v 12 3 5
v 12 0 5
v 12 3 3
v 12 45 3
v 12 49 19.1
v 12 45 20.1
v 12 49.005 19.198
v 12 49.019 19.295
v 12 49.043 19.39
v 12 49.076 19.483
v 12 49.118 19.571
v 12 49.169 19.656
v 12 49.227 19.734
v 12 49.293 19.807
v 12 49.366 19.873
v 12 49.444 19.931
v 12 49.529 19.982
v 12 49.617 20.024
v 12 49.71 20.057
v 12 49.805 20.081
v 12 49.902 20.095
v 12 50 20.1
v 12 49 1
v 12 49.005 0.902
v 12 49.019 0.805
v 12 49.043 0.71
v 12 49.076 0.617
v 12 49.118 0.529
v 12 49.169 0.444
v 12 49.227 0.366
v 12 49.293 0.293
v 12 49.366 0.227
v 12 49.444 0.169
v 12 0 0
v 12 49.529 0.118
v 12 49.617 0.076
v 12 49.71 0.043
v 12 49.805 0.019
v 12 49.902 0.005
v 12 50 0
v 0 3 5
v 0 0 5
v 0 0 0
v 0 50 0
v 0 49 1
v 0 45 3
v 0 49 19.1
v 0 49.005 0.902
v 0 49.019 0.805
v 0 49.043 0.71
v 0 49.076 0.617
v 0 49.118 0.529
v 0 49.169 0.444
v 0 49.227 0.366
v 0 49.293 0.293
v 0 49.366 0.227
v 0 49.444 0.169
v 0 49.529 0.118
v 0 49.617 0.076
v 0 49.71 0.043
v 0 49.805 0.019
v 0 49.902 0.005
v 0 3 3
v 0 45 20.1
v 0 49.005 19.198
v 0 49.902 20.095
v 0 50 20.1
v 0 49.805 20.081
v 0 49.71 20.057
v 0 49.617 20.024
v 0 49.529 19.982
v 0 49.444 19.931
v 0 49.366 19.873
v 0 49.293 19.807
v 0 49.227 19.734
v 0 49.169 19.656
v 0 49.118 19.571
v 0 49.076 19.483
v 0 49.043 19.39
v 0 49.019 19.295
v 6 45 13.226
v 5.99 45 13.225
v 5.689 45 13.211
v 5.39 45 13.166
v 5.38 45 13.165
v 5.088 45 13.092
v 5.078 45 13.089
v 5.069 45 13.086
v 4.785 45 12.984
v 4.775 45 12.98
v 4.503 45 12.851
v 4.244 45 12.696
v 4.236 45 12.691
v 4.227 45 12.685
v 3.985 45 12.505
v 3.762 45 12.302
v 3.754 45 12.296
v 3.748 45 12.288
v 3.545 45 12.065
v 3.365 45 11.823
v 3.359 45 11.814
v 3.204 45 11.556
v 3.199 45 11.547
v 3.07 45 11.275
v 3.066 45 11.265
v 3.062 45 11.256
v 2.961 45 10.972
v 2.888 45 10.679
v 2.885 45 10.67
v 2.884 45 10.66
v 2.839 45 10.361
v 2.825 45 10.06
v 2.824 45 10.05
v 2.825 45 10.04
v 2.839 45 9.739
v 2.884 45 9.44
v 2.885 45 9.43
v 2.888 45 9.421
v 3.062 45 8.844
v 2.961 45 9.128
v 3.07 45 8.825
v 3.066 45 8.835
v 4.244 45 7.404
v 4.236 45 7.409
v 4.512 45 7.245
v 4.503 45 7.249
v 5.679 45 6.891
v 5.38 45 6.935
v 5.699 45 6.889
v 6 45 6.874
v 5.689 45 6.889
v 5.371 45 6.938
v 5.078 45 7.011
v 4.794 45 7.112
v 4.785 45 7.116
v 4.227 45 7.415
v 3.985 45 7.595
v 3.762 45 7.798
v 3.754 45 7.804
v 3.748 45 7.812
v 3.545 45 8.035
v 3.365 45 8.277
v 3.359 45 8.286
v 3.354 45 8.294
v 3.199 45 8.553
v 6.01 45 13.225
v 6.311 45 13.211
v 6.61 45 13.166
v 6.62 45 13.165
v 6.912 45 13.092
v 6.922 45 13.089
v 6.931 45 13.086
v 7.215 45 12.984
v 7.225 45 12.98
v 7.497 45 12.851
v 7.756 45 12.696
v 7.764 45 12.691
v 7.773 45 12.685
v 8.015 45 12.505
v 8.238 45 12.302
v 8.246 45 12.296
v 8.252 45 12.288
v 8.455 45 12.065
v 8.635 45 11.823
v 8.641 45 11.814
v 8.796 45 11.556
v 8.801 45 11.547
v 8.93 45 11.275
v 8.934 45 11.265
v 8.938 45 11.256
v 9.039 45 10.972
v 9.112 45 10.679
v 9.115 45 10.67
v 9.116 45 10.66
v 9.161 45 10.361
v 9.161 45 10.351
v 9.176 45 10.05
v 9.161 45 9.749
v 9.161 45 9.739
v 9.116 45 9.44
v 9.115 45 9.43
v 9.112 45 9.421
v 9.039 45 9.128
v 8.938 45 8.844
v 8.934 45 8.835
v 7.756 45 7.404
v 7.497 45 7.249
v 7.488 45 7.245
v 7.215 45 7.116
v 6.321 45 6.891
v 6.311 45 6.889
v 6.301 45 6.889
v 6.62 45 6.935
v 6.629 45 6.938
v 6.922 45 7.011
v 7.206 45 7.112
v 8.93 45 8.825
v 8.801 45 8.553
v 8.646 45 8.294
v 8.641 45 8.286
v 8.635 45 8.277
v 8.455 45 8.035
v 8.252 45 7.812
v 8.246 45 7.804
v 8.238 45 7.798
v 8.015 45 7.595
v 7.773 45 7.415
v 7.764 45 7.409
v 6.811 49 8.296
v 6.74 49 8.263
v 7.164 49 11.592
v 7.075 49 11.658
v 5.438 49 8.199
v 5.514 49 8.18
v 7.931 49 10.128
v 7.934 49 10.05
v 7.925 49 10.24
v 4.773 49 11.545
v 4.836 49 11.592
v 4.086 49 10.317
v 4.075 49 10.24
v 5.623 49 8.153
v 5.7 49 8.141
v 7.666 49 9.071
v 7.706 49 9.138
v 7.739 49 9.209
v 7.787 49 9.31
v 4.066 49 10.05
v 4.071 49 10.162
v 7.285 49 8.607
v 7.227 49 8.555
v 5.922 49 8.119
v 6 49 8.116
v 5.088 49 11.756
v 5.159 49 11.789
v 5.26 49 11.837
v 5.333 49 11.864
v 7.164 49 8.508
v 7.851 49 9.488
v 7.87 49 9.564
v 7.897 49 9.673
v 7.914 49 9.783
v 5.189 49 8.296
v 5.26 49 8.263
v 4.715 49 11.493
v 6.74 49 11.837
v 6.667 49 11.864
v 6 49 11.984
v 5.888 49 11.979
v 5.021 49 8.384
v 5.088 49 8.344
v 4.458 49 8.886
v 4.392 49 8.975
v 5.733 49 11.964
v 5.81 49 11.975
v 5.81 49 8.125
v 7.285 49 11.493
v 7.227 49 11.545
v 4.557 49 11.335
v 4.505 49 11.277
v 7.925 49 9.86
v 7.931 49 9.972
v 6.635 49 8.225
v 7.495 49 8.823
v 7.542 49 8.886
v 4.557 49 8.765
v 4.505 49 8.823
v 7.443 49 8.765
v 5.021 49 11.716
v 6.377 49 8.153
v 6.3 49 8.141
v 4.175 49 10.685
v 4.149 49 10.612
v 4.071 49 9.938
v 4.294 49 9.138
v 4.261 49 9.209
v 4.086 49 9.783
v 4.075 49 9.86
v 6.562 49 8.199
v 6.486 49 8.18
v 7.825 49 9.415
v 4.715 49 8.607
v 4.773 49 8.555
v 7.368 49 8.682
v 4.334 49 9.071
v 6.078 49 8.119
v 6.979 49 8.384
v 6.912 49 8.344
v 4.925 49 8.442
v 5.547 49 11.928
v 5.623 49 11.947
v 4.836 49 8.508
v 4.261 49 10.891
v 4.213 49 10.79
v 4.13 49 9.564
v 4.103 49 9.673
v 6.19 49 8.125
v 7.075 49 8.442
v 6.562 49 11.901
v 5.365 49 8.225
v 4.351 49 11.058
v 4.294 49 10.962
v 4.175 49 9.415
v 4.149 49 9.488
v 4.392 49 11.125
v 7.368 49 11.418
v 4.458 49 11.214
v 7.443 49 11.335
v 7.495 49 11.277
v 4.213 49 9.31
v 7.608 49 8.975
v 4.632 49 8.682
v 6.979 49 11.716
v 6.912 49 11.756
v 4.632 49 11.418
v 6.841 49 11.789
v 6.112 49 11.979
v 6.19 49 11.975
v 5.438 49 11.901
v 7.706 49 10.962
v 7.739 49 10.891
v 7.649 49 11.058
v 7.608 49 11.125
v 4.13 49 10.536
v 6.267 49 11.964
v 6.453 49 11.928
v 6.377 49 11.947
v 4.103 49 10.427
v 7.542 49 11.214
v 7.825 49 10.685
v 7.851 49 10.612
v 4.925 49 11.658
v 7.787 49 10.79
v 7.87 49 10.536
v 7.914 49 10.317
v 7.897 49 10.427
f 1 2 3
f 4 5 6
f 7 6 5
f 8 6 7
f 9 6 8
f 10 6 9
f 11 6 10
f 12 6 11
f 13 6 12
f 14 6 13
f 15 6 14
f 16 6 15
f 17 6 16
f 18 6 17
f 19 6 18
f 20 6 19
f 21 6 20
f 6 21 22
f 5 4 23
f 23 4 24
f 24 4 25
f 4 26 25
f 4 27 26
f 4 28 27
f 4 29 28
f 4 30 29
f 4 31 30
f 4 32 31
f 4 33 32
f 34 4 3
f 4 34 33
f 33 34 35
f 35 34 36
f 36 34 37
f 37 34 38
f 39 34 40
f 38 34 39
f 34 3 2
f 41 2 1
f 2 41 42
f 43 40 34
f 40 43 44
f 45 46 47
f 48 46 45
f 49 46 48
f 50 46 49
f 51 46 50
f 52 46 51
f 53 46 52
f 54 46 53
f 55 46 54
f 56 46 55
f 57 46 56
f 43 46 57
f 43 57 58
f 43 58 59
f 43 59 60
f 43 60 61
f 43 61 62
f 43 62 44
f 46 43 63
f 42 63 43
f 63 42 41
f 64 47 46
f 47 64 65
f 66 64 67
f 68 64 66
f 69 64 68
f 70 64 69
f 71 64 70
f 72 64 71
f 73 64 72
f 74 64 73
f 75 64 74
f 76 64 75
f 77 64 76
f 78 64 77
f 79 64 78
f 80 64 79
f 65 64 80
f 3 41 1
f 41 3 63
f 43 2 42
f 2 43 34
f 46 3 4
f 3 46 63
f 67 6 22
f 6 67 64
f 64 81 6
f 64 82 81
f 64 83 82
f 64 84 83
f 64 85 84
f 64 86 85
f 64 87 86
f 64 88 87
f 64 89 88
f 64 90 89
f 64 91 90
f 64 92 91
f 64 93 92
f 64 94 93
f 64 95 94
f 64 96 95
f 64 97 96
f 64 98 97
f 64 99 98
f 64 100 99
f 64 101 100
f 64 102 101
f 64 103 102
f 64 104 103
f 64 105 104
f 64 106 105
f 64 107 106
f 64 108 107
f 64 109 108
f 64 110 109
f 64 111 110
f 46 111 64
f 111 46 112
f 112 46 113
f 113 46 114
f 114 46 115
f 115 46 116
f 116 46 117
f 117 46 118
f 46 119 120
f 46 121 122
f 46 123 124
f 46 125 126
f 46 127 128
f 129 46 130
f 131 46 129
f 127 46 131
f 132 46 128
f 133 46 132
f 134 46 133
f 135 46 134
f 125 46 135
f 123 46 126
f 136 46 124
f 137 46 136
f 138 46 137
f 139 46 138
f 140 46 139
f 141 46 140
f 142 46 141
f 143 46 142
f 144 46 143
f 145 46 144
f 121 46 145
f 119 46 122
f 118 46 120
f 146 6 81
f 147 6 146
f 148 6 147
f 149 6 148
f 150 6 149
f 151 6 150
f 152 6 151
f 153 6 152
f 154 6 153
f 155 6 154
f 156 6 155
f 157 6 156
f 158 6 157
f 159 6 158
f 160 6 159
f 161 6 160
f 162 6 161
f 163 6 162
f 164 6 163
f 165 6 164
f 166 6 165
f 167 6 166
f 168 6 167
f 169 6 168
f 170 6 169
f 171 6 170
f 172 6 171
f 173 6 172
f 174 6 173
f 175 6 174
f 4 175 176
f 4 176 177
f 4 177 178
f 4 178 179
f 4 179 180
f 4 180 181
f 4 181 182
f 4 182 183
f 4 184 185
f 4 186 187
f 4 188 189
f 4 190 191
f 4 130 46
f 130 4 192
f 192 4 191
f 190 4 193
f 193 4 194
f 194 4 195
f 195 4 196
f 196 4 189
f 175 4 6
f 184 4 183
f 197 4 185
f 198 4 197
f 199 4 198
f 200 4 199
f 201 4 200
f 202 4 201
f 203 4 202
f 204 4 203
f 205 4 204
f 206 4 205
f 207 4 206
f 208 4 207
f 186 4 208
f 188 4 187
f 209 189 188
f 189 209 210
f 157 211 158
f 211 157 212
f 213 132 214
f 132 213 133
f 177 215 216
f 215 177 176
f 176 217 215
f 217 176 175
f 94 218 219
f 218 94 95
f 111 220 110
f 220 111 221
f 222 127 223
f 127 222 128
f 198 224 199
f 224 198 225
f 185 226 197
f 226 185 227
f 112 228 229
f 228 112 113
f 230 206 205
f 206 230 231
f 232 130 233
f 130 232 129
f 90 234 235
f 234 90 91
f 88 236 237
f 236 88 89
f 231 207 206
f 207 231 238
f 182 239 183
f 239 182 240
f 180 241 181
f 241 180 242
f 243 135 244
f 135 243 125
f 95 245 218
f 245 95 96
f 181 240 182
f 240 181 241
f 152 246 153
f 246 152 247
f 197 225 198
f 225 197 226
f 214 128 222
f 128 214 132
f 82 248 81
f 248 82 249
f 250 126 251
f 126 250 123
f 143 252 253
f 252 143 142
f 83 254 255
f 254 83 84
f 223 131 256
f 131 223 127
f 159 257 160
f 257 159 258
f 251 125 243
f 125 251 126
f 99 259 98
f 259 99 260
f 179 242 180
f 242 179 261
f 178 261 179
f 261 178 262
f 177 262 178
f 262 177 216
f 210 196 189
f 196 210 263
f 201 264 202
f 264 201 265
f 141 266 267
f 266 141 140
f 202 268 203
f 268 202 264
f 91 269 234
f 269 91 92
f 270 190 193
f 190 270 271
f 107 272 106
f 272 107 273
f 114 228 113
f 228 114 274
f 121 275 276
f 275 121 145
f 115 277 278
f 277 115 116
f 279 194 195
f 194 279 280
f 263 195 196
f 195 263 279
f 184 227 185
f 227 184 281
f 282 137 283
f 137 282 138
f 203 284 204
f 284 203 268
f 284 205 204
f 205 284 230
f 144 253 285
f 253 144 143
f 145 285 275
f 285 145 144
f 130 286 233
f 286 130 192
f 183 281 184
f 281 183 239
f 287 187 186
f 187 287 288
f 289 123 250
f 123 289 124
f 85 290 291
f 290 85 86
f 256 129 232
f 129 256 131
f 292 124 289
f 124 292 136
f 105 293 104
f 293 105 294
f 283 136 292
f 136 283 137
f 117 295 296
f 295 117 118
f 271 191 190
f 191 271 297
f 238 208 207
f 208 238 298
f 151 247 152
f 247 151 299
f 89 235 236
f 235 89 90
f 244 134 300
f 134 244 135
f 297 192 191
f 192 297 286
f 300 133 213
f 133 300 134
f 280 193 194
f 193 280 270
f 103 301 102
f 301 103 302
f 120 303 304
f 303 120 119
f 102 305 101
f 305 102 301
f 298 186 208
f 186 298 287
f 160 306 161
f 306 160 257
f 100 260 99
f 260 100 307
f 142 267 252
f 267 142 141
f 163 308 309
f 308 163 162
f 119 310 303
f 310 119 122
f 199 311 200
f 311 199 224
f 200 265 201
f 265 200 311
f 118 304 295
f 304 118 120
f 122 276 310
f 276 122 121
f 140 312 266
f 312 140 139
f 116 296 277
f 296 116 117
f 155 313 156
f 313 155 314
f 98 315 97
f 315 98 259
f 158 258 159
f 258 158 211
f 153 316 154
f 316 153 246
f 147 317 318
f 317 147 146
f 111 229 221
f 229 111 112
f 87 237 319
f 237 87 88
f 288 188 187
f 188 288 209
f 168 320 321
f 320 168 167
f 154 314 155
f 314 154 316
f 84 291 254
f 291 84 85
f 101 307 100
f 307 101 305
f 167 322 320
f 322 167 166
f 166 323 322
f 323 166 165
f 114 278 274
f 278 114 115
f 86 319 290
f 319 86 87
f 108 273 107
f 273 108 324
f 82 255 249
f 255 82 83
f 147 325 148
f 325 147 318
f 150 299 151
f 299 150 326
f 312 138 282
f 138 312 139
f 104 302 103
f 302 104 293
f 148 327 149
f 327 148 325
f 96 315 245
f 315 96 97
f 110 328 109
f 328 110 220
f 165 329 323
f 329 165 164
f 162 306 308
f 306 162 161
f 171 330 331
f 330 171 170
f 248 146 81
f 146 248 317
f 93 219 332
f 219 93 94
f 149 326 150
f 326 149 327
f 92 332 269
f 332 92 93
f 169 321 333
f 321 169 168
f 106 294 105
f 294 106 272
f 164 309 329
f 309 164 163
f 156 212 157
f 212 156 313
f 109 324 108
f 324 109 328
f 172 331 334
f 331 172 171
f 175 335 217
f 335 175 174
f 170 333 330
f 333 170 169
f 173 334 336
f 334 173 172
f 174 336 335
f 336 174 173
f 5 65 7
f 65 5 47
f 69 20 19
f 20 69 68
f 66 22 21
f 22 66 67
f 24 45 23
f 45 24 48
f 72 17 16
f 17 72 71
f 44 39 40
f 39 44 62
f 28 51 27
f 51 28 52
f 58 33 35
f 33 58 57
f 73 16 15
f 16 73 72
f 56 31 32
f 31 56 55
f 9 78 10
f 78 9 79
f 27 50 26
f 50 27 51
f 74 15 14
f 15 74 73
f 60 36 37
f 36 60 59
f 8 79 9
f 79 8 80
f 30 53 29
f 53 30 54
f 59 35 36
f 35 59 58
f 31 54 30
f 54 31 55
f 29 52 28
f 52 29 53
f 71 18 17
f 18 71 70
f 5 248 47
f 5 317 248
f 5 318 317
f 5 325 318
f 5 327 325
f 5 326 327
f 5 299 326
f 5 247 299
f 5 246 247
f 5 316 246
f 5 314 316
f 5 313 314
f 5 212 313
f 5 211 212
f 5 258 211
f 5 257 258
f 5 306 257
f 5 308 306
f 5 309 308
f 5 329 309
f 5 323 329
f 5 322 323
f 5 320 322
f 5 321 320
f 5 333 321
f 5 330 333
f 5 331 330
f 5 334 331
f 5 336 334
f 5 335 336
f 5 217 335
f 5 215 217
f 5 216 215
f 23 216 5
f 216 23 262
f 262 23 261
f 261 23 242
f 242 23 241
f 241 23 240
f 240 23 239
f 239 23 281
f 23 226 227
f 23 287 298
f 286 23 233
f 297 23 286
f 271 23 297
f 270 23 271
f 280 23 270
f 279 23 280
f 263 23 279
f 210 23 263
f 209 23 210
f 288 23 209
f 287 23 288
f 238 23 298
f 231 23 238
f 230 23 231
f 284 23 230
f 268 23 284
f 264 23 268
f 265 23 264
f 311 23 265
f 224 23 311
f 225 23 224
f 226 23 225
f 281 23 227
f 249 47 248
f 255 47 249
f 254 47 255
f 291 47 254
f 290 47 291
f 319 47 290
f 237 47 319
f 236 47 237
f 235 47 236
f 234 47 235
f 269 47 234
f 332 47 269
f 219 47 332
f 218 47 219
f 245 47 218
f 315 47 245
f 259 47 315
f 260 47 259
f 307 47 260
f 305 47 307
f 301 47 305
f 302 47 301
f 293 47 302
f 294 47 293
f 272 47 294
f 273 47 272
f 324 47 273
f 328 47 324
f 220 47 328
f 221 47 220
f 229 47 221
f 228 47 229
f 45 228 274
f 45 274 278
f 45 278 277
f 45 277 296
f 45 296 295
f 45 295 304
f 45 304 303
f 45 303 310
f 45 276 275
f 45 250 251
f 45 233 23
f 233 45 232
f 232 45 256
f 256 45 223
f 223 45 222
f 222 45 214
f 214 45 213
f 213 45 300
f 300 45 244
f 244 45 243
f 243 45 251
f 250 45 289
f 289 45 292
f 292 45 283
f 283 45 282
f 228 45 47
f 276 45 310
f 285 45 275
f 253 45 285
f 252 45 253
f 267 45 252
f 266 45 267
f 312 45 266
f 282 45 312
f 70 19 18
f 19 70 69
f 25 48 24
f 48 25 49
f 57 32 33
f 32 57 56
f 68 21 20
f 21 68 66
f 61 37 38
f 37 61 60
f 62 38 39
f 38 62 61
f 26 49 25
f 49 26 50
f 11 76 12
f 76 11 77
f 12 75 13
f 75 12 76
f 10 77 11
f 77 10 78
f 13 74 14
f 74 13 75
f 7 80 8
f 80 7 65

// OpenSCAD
width = 12;
length = 50;
height = 20.1;
wall = 3;
wall_back = 5;
diameter1 = 3;
diameter2 = 6.6;
clearance = 0.4;
pin_length = 5;
pin_diameter = 4;
border_radius = 1;

// back
difference() {

    union() {
        // front
        cube ([width, wall, 5]);

        // bottom
        cube ([width, length, wall]);

        // back
        translate ([0, length-wall_back, 0]) cube ([width, wall_back, height]);
    }
    
    // screw hole
    translate ([width/2, length+clearance, height/2]) {
        rotate (90, [1,0,0])
            cylinder (d1=diameter1, d2=diameter2, h=wall_back+2*clearance, $fn=64);
    }
    translate ([0, 0, 0]) {
        rotate (90, [0,1,0]) {
            hull() {
                translate ([-border_radius, length, -clearance]) {
                    cylinder (r=border_radius, h=width+2*clearance, $fn=64);
                }
                translate ([-height+border_radius, length, -clearance]) {
                    cylinder (r=border_radius, h=width+2*clearance, $fn=64);
                }
            }
        }
    }
}

// pin
/*
translate ([width/2, length, 0]) {
    rotate (-90, [1,0,0]) {
        difference() {
            cylinder (d=pin_diameter, h=pin_length, $fn=64);
            translate ([-pin_diameter/2, 0, 0])
                cube ([pin_diameter,pin_diameter,pin_length]);
        }
    }
}
*/
